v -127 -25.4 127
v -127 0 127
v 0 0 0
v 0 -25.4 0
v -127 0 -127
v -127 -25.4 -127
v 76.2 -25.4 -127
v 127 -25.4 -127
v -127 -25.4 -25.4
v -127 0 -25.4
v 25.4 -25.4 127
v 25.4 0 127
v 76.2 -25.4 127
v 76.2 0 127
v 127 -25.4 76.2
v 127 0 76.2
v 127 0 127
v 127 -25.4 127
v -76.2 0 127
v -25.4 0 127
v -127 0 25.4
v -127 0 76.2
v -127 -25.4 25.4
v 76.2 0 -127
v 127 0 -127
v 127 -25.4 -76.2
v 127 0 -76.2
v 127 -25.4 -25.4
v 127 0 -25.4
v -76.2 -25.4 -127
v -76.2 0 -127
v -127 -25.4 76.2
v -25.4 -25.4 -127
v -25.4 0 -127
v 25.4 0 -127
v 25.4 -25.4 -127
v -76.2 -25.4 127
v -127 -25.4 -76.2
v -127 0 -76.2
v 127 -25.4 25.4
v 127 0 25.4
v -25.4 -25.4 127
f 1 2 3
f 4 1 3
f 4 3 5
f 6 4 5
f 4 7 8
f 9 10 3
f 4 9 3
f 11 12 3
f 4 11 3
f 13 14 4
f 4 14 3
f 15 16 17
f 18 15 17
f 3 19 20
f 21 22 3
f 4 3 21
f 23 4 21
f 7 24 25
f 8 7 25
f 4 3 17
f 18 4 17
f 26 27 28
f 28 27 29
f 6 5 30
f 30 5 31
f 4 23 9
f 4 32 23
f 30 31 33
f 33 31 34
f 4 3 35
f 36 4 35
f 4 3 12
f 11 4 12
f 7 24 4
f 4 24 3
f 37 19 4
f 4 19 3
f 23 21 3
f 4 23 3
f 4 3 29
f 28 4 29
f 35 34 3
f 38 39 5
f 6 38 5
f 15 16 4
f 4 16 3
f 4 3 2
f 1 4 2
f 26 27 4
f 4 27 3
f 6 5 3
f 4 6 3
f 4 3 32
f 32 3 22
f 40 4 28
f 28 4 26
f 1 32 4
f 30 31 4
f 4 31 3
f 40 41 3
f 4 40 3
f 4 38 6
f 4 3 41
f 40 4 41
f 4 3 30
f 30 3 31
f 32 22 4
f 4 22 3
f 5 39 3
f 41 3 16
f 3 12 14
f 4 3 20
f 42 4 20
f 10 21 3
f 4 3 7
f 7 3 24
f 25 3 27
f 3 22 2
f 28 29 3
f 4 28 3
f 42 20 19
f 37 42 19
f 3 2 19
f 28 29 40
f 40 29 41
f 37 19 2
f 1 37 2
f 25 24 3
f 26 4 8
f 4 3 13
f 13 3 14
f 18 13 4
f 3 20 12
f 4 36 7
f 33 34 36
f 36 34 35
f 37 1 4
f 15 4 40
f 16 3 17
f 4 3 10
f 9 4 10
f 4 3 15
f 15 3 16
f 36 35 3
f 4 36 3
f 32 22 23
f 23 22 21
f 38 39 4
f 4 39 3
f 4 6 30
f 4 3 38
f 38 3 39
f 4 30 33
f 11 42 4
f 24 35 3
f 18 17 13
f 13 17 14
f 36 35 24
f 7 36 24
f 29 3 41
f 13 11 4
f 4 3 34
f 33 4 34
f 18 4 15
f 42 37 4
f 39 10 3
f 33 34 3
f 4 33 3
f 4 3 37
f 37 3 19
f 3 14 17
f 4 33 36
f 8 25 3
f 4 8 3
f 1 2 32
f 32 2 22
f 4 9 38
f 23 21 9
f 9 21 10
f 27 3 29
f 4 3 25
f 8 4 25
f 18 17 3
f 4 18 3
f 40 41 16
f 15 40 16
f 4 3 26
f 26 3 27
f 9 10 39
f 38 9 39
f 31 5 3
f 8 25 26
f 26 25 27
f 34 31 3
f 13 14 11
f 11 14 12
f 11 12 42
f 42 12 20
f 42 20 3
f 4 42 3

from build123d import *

# Parameters (mm, degrees)
F1_DEPTH  = 25.4
F2_DEPTH  = 25.4
F3_DEPTH  = 25.4
F4_DEPTH  = 25.4
F5_DEPTH  = 25.4
F6_DEPTH  = 25.4
F7_DEPTH  = 25.4
F8_DEPTH  = 25.4
F9_DEPTH  = 25.4
F10_DEPTH = 25.4
F11_DEPTH = 25.4
F12_DEPTH = 25.4


with BuildPart() as f1:
    # F0 (on Front) → F1 (new body)
    with BuildSketch(Plane.XZ):
        Polygon((-127, 76.2), (0, 0), (-127, 127), align=None)
    extrude(amount=F1_DEPTH)


with BuildPart() as f2:
    # F0 (on Front) → F2 (new body)
    with BuildSketch(Plane.XZ):
        Polygon((0, 0), (-76.2, 127), (-127, 127), align=None)
    extrude(amount=F2_DEPTH)


with BuildPart() as f3:
    # F0 (on Front) → F3 (new body)
    with BuildSketch(Plane.XZ):
        Polygon((0, 0), (-25.4, 127), (-76.2, 127), align=None)
        Polygon((25.4, -127), (0, 0), (-25.4, -127), (0, -127), align=None)
    extrude(amount=F3_DEPTH)


with BuildPart() as f4:
    # F0 (on Front) → F4 (new body)
    with BuildSketch(Plane.XZ):
        Polygon((25.4, 127), (0, 127), (-25.4, 127), (0, 0), align=None)
        Polygon((-25.4, -127), (0, 0), (-76.2, -127), align=None)
    extrude(amount=F4_DEPTH)


with BuildPart() as f5:
    # F0 (on Front) → F5 (new body)
    with BuildSketch(Plane.XZ):
        Polygon((76.2, 127), (25.4, 127), (0, 0), align=None)
        Polygon((-76.2, -127), (0, 0), (-127, -127), align=None)
    extrude(amount=F5_DEPTH)


with BuildPart() as f6:
    # F0 (on Front) → F6 (new body)
    with BuildSketch(Plane.XZ):
        Polygon((-127, -127), (0, 0), (-127, -76.2), align=None)
    extrude(amount=F6_DEPTH)


with BuildPart() as f7:
    # F0 (on Front) → F7 (new body)
    with BuildSketch(Plane.XZ):
        Polygon((76.2, 127), (0, 0), (127, 127), align=None)
        Polygon((-127, -76.2), (0, 0), (-127, -25.4), align=None)
    extrude(amount=F7_DEPTH)


with BuildPart() as f8:
    # F0 (on Front) → F8 (new body)
    with BuildSketch(Plane.XZ):
        Polygon((127, 127), (0, 0), (127, 76.2), align=None)
        Polygon((76.2, -127), (0, 0), (25.4, -127), align=None)
    extrude(amount=F8_DEPTH)


with BuildPart() as f9:
    # F0 (on Front) → F9 (new body)
    with BuildSketch(Plane.XZ):
        Polygon((127, 76.2), (0, 0), (127, 25.4), align=None)
        Polygon((127, -127), (0, 0), (76.2, -127), align=None)
    extrude(amount=F9_DEPTH)


with BuildPart() as f10:
    # F0 (on Front) → F10 (new body)
    with BuildSketch(Plane.XZ):
        Polygon((127, 25.4), (0, 0), (127, -25.4), (127, 0), align=None)
        Polygon((-127, -25.4), (0, 0), (-127, 25.4), (-127, 0), align=None)
    extrude(amount=F10_DEPTH)


with BuildPart() as f11:
    # F0 (on Front) → F11 (new body)
    with BuildSketch(Plane.XZ):
        Polygon((127, -76.2), (0, 0), (127, -127), align=None)
        Polygon((-127, 25.4), (0, 0), (-127, 76.2), align=None)
    extrude(amount=F11_DEPTH)


with BuildPart() as f12:
    # F0 (on Front) → F12 (new body)
    with BuildSketch(Plane.XZ):
        Polygon((127, -25.4), (0, 0), (127, -76.2), align=None)
    extrude(amount=F12_DEPTH)


solid = Compound([f1.part, f2.part, f3.part, f4.part, f5.part, f6.part, f7.part, f8.part, f9.part, f10.part, f11.part, f12.part])
